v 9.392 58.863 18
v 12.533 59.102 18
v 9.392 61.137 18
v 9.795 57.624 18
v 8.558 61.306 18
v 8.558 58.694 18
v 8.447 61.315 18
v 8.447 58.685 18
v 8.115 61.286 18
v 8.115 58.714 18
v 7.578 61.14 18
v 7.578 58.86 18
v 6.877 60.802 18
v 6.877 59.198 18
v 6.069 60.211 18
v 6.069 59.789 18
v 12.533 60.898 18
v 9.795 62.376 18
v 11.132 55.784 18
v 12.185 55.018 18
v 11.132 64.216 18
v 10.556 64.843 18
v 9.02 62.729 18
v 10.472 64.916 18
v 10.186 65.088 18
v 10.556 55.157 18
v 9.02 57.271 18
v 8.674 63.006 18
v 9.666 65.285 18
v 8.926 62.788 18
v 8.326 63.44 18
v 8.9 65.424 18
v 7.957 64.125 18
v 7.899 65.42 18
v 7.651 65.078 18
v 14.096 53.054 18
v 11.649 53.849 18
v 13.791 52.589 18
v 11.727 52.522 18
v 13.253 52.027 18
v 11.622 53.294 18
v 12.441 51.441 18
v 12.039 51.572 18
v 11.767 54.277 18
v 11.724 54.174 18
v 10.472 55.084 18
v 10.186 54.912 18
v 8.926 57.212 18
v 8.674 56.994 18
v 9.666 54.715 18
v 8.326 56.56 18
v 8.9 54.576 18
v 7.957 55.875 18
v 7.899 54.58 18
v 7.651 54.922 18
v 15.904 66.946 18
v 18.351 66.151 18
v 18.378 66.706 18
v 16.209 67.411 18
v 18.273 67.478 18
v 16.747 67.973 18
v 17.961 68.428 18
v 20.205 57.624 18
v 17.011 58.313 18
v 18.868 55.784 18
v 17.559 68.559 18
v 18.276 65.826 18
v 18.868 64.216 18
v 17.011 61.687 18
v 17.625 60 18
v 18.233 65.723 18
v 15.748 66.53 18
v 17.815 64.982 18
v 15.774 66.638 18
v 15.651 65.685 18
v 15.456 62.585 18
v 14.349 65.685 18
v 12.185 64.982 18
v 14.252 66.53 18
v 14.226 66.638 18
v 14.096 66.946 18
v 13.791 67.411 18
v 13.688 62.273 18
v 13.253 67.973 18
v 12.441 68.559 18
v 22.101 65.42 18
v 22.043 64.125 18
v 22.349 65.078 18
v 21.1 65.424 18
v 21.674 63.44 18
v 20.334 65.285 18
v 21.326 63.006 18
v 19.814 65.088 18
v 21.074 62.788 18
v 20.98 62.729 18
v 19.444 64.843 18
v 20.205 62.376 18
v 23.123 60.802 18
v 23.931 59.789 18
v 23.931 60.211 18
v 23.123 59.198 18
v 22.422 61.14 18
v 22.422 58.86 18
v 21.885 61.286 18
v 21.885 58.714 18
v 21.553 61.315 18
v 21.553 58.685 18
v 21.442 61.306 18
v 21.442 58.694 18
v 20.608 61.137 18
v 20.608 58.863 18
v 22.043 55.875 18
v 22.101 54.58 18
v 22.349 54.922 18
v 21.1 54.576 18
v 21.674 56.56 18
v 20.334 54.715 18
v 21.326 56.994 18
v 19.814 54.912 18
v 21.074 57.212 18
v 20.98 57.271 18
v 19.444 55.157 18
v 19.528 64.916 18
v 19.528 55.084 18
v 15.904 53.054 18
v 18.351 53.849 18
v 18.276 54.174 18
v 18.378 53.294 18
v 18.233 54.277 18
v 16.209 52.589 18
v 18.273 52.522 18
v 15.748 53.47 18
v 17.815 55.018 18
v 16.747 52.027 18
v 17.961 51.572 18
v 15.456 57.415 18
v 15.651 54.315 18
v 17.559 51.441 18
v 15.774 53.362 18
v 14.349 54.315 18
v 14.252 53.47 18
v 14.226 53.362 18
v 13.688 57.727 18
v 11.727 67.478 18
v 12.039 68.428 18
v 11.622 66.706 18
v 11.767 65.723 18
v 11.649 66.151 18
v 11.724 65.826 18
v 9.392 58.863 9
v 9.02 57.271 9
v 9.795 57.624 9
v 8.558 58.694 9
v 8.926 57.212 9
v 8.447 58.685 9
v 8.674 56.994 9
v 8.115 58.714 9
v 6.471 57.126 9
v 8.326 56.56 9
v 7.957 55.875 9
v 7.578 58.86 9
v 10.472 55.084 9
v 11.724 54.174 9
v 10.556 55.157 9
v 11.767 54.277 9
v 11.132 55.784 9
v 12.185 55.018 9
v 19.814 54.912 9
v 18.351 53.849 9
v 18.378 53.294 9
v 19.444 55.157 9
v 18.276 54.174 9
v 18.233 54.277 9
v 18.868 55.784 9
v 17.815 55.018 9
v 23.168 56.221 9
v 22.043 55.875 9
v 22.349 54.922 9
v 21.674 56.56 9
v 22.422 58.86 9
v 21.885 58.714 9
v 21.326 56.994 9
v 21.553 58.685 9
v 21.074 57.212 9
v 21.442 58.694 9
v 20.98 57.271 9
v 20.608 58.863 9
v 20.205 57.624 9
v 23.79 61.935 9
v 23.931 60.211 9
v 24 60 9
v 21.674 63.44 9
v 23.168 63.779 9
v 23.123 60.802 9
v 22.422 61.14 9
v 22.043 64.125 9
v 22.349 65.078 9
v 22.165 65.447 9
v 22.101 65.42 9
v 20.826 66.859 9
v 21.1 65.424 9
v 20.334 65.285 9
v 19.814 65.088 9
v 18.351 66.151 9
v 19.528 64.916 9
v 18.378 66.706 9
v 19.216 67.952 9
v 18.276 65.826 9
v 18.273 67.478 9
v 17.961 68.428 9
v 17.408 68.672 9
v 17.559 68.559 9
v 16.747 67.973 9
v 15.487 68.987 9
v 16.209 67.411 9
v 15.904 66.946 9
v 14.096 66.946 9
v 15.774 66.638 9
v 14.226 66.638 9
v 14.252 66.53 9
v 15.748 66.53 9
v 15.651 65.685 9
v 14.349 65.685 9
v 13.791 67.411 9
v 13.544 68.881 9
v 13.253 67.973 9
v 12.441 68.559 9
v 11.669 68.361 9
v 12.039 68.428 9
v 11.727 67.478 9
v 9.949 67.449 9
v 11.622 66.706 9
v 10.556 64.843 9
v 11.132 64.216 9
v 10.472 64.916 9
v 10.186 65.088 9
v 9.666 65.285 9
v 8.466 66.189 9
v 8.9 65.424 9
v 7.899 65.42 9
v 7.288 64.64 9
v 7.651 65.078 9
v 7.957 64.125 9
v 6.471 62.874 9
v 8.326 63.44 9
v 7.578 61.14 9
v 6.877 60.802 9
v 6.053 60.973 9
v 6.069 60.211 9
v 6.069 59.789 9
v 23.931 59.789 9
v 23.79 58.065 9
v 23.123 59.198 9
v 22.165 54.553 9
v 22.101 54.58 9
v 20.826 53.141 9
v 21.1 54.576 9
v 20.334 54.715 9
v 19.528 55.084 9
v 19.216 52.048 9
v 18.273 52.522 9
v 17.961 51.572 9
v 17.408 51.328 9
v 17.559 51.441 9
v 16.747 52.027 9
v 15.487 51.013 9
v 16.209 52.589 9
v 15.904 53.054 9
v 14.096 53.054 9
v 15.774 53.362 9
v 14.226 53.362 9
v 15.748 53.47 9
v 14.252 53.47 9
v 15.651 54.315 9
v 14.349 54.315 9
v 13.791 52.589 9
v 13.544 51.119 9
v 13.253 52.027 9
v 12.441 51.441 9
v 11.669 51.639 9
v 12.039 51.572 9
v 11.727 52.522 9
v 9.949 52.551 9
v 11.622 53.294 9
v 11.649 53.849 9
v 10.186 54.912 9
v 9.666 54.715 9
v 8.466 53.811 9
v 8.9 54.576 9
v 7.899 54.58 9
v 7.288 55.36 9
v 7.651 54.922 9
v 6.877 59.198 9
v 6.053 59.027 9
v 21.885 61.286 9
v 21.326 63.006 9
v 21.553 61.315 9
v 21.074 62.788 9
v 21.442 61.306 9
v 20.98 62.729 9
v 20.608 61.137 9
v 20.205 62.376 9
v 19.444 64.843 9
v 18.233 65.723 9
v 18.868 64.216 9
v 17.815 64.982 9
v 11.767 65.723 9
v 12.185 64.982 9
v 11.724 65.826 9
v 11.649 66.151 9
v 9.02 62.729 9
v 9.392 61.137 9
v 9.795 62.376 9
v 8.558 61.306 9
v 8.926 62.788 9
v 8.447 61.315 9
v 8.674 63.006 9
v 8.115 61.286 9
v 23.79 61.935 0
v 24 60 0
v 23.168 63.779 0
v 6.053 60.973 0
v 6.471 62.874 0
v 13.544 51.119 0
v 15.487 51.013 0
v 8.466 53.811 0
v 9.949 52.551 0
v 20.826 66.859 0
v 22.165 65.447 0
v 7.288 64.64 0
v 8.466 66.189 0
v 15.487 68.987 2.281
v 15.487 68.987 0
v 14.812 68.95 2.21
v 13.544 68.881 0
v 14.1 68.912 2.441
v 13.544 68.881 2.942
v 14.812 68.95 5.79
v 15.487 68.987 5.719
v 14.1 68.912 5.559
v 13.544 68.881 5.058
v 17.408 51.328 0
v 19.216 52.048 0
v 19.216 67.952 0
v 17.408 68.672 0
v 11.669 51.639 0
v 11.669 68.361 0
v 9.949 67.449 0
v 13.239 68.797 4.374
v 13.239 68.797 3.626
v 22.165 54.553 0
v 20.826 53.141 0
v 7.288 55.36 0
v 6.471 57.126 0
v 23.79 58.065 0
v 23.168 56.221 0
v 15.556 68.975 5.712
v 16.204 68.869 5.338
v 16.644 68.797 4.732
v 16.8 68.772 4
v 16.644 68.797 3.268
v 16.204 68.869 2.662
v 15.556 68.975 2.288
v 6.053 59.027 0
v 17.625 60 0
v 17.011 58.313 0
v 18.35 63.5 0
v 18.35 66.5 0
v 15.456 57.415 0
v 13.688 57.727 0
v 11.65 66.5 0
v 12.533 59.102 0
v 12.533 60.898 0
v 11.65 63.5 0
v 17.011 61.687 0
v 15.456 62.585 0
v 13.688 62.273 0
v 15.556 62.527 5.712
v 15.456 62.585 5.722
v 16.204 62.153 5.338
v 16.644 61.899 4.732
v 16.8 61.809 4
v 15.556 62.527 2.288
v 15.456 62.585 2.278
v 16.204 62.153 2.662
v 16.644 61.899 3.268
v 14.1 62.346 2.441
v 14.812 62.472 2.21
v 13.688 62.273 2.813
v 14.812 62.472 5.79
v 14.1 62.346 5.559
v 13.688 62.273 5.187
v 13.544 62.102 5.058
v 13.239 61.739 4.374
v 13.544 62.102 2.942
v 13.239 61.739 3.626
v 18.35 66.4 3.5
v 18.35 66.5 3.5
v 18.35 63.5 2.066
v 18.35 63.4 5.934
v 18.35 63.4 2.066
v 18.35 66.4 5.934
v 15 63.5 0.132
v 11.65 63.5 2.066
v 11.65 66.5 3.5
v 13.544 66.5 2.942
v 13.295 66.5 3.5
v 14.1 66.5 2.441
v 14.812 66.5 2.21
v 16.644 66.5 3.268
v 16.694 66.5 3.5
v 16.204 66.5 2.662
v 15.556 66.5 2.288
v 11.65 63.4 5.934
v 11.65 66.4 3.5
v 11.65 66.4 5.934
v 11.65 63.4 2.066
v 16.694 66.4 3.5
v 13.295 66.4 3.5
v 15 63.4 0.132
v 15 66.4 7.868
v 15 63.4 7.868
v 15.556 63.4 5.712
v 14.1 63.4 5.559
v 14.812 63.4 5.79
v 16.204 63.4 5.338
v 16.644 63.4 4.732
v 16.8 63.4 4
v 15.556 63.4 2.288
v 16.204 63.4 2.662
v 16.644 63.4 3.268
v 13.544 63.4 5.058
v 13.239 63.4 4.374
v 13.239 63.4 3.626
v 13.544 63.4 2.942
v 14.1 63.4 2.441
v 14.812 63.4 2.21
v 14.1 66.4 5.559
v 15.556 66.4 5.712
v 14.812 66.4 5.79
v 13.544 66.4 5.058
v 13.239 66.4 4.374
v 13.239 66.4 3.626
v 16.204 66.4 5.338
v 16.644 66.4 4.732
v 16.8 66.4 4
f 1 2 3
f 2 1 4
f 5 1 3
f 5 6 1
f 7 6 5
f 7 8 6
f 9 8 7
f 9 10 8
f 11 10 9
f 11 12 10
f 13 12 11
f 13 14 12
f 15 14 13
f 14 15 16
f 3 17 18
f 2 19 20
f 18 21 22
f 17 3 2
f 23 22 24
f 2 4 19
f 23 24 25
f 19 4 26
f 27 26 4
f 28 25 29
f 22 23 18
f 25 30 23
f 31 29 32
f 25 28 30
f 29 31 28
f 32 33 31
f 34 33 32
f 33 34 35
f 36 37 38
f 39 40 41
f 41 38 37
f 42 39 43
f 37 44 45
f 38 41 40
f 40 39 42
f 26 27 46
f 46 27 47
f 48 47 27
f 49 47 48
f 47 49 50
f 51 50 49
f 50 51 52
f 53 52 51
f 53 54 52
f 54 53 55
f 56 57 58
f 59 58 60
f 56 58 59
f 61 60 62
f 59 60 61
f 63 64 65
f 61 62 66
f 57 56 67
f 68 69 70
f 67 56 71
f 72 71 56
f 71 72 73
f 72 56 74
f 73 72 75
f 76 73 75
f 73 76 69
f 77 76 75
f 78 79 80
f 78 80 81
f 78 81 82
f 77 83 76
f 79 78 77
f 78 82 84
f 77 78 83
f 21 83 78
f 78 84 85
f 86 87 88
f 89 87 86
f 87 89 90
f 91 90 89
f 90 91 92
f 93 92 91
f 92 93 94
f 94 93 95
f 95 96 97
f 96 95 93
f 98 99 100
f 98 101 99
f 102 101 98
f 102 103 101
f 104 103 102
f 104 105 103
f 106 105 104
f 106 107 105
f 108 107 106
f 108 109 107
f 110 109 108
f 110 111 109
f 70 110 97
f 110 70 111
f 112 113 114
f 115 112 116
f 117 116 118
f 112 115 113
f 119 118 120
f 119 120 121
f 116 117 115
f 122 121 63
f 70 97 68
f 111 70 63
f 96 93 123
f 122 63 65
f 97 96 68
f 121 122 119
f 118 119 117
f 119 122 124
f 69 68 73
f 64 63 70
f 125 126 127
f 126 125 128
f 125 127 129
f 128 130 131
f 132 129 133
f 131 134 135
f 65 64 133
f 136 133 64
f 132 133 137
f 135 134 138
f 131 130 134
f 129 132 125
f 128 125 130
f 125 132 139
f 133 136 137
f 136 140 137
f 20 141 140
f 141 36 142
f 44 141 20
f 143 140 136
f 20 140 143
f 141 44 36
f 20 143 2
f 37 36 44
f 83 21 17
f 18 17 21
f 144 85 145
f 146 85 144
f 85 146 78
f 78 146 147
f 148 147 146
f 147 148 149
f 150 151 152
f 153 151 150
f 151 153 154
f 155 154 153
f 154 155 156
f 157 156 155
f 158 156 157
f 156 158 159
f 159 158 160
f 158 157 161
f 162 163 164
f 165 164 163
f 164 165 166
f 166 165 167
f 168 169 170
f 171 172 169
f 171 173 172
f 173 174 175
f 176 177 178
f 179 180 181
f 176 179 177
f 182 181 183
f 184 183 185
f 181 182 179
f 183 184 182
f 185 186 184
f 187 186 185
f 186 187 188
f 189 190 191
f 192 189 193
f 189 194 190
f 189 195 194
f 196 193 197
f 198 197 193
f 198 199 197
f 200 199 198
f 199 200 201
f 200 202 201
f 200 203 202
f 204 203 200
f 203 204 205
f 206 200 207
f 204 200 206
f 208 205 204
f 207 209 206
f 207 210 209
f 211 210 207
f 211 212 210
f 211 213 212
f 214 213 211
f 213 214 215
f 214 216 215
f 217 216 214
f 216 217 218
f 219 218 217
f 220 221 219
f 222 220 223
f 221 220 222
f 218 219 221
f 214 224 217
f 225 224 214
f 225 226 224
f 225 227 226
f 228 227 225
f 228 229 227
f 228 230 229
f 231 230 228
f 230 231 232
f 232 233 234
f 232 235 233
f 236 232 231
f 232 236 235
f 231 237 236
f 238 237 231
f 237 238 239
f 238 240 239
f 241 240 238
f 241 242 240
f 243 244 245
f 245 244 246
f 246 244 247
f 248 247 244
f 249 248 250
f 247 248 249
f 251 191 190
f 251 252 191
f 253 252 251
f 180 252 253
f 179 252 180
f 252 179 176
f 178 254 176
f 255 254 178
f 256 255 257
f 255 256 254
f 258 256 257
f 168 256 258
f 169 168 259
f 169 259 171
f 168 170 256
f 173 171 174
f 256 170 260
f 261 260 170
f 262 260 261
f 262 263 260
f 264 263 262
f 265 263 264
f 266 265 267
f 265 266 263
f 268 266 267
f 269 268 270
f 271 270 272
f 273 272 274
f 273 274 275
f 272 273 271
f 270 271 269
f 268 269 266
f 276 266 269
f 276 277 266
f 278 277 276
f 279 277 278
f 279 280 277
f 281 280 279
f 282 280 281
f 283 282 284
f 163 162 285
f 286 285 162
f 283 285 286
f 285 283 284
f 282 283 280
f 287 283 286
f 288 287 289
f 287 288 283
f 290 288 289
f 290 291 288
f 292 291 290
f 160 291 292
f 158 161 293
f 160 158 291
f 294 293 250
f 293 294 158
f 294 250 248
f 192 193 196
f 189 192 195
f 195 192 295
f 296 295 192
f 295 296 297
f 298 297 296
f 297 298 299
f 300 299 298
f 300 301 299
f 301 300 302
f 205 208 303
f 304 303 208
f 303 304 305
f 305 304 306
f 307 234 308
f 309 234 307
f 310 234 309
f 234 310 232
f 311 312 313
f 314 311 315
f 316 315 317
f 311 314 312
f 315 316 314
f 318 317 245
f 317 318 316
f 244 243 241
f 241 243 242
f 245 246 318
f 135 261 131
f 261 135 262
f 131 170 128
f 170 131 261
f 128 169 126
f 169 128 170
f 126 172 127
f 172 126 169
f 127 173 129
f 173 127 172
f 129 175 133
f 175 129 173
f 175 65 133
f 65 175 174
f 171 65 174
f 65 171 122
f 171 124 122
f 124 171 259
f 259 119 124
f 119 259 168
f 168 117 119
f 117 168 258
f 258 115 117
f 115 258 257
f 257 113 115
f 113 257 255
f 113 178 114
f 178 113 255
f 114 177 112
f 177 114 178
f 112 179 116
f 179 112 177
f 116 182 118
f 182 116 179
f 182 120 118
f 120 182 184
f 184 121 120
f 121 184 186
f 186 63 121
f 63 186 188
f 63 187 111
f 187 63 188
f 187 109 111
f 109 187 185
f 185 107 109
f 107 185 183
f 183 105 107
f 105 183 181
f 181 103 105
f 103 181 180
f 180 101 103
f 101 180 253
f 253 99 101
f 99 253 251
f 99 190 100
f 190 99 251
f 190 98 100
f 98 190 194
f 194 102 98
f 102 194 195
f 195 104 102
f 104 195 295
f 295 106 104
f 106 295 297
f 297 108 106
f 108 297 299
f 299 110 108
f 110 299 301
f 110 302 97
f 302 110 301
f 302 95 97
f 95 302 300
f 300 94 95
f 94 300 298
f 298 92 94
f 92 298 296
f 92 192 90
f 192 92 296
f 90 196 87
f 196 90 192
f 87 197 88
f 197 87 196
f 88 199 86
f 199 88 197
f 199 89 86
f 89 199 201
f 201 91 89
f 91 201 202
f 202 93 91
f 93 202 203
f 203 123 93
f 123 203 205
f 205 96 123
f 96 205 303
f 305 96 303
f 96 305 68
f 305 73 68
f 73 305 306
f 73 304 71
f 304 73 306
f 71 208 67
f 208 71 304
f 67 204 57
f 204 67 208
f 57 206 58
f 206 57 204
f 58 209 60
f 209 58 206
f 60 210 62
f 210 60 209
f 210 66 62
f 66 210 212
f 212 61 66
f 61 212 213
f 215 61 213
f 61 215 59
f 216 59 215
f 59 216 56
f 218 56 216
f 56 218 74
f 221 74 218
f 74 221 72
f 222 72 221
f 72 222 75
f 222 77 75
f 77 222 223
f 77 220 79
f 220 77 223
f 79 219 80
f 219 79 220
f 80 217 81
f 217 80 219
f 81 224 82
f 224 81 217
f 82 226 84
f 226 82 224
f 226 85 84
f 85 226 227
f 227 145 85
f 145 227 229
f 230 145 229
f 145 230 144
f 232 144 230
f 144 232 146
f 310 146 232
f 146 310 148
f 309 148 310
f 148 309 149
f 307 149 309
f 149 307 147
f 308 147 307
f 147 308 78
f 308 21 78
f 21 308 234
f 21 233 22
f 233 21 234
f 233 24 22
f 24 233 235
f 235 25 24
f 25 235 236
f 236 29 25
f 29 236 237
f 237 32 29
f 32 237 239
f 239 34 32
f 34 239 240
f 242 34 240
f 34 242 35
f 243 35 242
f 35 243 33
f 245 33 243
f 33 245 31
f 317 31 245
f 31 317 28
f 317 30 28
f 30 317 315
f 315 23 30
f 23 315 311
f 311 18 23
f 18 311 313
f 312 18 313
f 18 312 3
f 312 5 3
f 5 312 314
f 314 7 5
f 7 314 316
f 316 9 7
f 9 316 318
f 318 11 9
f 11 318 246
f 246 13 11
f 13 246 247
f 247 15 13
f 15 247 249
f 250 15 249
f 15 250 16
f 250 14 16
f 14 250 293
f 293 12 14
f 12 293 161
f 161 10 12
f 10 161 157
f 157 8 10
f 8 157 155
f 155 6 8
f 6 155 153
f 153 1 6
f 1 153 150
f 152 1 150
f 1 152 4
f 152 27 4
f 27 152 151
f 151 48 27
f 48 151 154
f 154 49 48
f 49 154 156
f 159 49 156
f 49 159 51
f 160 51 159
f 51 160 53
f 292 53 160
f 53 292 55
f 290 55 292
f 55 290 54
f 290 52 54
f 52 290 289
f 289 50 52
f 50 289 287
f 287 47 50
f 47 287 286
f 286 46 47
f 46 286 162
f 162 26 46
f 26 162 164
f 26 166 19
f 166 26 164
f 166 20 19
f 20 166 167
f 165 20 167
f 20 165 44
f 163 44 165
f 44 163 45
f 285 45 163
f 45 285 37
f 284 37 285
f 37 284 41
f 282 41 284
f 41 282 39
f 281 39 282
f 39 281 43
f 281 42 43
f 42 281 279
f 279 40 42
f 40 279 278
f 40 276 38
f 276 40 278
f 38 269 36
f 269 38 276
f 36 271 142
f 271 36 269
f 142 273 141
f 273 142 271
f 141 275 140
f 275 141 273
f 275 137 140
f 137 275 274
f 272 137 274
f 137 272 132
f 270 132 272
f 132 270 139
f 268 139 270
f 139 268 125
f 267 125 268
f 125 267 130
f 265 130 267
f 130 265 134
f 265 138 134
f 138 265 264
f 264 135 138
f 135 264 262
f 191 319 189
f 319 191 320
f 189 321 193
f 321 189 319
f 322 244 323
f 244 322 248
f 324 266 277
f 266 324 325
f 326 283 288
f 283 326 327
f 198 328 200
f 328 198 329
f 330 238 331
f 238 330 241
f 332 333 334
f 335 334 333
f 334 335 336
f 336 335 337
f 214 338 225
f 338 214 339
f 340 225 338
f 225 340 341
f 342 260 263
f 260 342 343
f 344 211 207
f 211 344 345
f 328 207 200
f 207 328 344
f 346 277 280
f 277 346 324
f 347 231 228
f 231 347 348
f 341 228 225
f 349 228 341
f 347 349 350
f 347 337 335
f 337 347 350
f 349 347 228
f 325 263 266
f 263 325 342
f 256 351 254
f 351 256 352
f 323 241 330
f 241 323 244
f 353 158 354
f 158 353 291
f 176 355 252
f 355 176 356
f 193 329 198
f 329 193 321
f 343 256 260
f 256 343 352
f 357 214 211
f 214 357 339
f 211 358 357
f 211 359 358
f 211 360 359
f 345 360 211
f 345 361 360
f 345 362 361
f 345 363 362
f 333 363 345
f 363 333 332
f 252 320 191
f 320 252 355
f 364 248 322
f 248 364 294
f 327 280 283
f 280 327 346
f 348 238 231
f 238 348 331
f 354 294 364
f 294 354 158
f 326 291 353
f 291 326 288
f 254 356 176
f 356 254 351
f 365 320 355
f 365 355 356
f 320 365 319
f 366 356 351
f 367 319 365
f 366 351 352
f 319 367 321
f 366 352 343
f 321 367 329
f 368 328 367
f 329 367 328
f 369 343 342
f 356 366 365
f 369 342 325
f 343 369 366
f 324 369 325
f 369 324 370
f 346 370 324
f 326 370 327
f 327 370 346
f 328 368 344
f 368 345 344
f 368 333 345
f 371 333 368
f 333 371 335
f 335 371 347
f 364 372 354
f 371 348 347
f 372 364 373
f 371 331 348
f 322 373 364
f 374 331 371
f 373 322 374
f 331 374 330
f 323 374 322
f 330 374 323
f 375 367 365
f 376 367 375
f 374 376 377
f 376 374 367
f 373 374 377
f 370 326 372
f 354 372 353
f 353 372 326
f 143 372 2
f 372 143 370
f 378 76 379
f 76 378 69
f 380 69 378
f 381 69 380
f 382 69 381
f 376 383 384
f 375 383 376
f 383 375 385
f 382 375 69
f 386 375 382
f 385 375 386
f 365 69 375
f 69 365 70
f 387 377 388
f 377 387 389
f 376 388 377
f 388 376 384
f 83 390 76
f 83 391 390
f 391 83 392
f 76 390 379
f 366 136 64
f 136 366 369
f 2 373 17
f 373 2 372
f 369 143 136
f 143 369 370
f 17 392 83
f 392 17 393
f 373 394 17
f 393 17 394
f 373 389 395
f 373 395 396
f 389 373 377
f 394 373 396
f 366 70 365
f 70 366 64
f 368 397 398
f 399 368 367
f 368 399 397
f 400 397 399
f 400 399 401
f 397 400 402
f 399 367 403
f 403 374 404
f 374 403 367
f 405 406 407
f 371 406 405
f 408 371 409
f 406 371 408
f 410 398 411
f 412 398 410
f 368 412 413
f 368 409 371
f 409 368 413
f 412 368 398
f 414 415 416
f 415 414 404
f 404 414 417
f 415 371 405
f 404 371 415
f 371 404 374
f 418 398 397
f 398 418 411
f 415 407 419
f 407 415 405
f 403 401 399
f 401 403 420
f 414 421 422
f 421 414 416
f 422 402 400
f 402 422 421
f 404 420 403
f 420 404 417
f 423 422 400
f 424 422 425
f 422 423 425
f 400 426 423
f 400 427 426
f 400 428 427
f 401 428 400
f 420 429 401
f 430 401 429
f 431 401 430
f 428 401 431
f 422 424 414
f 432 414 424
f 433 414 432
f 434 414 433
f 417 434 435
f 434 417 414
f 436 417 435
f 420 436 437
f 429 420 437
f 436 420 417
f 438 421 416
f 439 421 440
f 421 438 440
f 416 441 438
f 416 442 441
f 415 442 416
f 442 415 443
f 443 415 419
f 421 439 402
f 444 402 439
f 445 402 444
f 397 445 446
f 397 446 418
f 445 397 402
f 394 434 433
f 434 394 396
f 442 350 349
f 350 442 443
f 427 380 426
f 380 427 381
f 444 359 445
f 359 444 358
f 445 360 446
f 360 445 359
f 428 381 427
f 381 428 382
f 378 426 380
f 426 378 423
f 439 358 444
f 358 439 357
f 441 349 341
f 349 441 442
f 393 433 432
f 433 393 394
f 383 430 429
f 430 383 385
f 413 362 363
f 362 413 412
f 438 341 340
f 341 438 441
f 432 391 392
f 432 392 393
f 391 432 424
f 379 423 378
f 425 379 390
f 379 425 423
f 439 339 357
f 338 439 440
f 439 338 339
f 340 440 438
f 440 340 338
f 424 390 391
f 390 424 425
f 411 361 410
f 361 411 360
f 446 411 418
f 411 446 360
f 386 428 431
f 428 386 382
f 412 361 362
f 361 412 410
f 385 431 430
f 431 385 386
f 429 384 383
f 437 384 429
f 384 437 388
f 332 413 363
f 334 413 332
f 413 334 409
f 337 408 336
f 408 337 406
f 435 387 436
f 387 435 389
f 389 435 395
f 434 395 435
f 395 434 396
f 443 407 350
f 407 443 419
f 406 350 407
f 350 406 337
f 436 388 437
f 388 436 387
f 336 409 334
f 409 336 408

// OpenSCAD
// file: functions.scad
// PRUSA Mendel  
// Functions used in many files
// GNU GPL v2
// Josef Průša
// josefprusa@me.com
// prusadjs.cz
// http://www.reprap.org/wiki/Prusa_Mendel
// http://github.com/prusajr/PrusaMendel

module nut(d,h,horizontal=true){
cornerdiameter =  (d / 2) / cos (180 / 6);
cylinder(h = h, r = cornerdiameter, $fn = 6);
if(horizontal){
for(i = [1:6]){
	rotate([0,0,60*i]) translate([-cornerdiameter-0.2,0,0]) rotate([0,0,-45]) cube(size = [2,2,h]);
}}
}

// By nophead
module polyhole(d,h) {
    n = max(round(2 * d),3);
    rotate([0,0,180])
        cylinder(h = h, r = (d / 2) / cos (180 / n), $fn = n);
}




module roundcorner(diameter){
	difference(){
		cube(size = [diameter,diameter,99], center = false);
		translate(v = [diameter, diameter, 0]) cylinder(h = 100, r=diameter, center=true);
	}
}
// file: metric.scad
// PRUSA Mendel  
// Default metric sizes
// GNU GPL v2
// Josef Průša
// josefprusa@me.com
// prusadjs.cz
// http://www.reprap.org/wiki/Prusa_Mendel
// http://github.com/prusajr/PrusaMendel

// DONT CHANGE THIS FILE! ALTER VALUES IN CONFIGURATION.SCAD INSTEAD

// RODS

threaded_rod_diameter = 8.2;
threaded_rod_diameter_horizontal = 8.2;
smooth_bar_diameter = 8;
smooth_bar_diameter_horizontal = 8.5;

// Nuts and bolts

m8_diameter = 9;
m8_nut_diameter = 16.4;

m4_diameter = 4.5;
m4_nut_diameter = 9;

m3_diameter = 3.6;
m3_nut_diameter = 6.1;

// Bushing holder

bushing_core_diameter = smooth_bar_diameter;
bushing_material_thickness = 1;

// Motors

motor_shaft = 5.5;
// file: configuration.scad
// PRUSA Mendel  
// Configuration file
// GNU GPL v2
// Josef Průša
// josefprusa@me.com
// prusadjs.cz
// http://www.reprap.org/wiki/Prusa_Mendel
// http://github.com/prusajr/PrusaMendel

// PLEASE SELECT ONE OF THE CONFIGURATIONS BELOW
// BY UN-COMMENTING IT

// Uncomment for metric settings
// METRIC METRIC METRIC METRIC METRIC METRIC METRIC METRIC 

include <metric.scad>;

// Uncomment for imperial settings
// IMPERIAL IMPERIAL IMPERIAL IMPERIAL IMPERIAL IMPERIAL IMPERIAL 

//include <sae.scad>;


// CUSTOM CUSTOM CUSTOM CUSTOM CUSTOM CUSTOM CUSTOM CUSTOM CUSTOM

thin_wall = 3;

// LM8UU
linear =0;


// CHANGE ONLY THE STUFF YOU KNOW
// IT WILL REPLACE DEFAULT SETTING

// RODS

// threaded_rod_diameter = 0;
// threaded_rod_diameter_horizontal = 0;
// smooth_bar_díameter = 0;
// smooth_bar_díameter_horizontal = 0;

// Nuts and bolts

// m8_diameter = 0;
// m8_nut_diameter = 0;

// m4_diameter = 0;
// m4_nut_diameter = 0;

// m3_diameter = 0;
// m3_nut_diameter = 0;

// Bushing holder

// bushing_core_diameter = smooth_bar_díameter;
// bushing_material_thickness = 0;


///counted stuff
m3_nut_diameter_bigger = ((m3_nut_diameter  / 2) / cos (180 / 6))*2;

// functions 
include <functions.scad>
// main file
// Greg's Wade Gears.
// It is licensed under the Creative Commons - GNU GPL license. 
//  2010 by GregFrost
// Parametric extruder gears based on prusa git repo.
// http://www.thingiverse.com/thing:6713

include <configuration.scad>
use <inc/parametric_involute_gear_v5.0.scad>

//translate([55,40,0]) 
//WadesL(); //this module call will make the large gear
translate([15,60,0]) 
WadesS(); //this module call will make the small gear

/**
 * @id large-gear
 * @name Large extruder gear
 * @category Printed
 * @using 1 hobbed-bolt
 * @step Insert hobbed bolt into main hole.
 * @step Add some M8 washers from other side, later with their count you adjust position of hobbed part in filament path.
 */

/**
 * @id small-gear
 * @name Small extruder gear
 * @category Printed
 * @using 1 m3nut
 * @using 1 m3xgrubscrew
 * @step Insert nut into cavity in printed gear.
 * @step Tighten the grub screw a bit, just to hold in place.
 */

/**
 * @name M8 hobbed bolt
 * @category Nuts&bolts
 * @id hobbed-bolt
 * @step Use thread cutting bit in electric screwdriver ...
 */

module WadesL(){
	num_holes=7;
	hole_size=6;
	hole_offset=18.5;
	gear_thickness=5;
	nut_trap_depth=3;
	nut_trap_thickness=6;

	difference(){
		gear (number_of_teeth=43,
			circular_pitch=268,
			gear_thickness =gear_thickness,
			rim_thickness = 7,
			rim_width = 3,
			hub_thickness = nut_trap_thickness+nut_trap_depth,
			hub_diameter = 22,
			bore_diameter = 8,
			circles=0);

		translate([0,0,nut_trap_thickness])
		rotate(30)
		cylinder($fn=6,r=m8_nut_diameter/2-0.5,h=nut_trap_depth+1);

color([0,0,1])
		for (hole=[0:num_holes-1])
		{
			rotate([0,0,360/num_holes*hole])
			translate([hole_offset,0,0])
			rotate(10)
			translate([0,0,-1])
			{
				cylinder(r=hole_size,h=gear_thickness+2);
				cube([hole_size,hole_size,gear_thickness+2]);
			}
		}
	}
}

module WadesS(){
	difference(){
translate([0,0,18]) mirror([ 0, 0, 1 ]) gear (number_of_teeth=10,
			circular_pitch=268,
			gear_thickness = 9,
			rim_thickness = 9,
			hub_thickness = 18,
			hub_diameter = 18,
			bore_diameter = 5.25,
			circles=0);
		translate([0,20,4])rotate([90,0,0])
	union()
	{
		//entrance
		translate([0,-3,15]) cube([m3_nut_diameter+0.6,5,3],center=true);
		//nut
		translate([0,0,13.6]) rotate([0,0,30]) nut(m3_nut_diameter+0.6, 3, false);
		//grub hole
		translate([0,0,9]) cylinder(r=m3_diameter/2,h=10, $fn=15);
	}
	}
}
